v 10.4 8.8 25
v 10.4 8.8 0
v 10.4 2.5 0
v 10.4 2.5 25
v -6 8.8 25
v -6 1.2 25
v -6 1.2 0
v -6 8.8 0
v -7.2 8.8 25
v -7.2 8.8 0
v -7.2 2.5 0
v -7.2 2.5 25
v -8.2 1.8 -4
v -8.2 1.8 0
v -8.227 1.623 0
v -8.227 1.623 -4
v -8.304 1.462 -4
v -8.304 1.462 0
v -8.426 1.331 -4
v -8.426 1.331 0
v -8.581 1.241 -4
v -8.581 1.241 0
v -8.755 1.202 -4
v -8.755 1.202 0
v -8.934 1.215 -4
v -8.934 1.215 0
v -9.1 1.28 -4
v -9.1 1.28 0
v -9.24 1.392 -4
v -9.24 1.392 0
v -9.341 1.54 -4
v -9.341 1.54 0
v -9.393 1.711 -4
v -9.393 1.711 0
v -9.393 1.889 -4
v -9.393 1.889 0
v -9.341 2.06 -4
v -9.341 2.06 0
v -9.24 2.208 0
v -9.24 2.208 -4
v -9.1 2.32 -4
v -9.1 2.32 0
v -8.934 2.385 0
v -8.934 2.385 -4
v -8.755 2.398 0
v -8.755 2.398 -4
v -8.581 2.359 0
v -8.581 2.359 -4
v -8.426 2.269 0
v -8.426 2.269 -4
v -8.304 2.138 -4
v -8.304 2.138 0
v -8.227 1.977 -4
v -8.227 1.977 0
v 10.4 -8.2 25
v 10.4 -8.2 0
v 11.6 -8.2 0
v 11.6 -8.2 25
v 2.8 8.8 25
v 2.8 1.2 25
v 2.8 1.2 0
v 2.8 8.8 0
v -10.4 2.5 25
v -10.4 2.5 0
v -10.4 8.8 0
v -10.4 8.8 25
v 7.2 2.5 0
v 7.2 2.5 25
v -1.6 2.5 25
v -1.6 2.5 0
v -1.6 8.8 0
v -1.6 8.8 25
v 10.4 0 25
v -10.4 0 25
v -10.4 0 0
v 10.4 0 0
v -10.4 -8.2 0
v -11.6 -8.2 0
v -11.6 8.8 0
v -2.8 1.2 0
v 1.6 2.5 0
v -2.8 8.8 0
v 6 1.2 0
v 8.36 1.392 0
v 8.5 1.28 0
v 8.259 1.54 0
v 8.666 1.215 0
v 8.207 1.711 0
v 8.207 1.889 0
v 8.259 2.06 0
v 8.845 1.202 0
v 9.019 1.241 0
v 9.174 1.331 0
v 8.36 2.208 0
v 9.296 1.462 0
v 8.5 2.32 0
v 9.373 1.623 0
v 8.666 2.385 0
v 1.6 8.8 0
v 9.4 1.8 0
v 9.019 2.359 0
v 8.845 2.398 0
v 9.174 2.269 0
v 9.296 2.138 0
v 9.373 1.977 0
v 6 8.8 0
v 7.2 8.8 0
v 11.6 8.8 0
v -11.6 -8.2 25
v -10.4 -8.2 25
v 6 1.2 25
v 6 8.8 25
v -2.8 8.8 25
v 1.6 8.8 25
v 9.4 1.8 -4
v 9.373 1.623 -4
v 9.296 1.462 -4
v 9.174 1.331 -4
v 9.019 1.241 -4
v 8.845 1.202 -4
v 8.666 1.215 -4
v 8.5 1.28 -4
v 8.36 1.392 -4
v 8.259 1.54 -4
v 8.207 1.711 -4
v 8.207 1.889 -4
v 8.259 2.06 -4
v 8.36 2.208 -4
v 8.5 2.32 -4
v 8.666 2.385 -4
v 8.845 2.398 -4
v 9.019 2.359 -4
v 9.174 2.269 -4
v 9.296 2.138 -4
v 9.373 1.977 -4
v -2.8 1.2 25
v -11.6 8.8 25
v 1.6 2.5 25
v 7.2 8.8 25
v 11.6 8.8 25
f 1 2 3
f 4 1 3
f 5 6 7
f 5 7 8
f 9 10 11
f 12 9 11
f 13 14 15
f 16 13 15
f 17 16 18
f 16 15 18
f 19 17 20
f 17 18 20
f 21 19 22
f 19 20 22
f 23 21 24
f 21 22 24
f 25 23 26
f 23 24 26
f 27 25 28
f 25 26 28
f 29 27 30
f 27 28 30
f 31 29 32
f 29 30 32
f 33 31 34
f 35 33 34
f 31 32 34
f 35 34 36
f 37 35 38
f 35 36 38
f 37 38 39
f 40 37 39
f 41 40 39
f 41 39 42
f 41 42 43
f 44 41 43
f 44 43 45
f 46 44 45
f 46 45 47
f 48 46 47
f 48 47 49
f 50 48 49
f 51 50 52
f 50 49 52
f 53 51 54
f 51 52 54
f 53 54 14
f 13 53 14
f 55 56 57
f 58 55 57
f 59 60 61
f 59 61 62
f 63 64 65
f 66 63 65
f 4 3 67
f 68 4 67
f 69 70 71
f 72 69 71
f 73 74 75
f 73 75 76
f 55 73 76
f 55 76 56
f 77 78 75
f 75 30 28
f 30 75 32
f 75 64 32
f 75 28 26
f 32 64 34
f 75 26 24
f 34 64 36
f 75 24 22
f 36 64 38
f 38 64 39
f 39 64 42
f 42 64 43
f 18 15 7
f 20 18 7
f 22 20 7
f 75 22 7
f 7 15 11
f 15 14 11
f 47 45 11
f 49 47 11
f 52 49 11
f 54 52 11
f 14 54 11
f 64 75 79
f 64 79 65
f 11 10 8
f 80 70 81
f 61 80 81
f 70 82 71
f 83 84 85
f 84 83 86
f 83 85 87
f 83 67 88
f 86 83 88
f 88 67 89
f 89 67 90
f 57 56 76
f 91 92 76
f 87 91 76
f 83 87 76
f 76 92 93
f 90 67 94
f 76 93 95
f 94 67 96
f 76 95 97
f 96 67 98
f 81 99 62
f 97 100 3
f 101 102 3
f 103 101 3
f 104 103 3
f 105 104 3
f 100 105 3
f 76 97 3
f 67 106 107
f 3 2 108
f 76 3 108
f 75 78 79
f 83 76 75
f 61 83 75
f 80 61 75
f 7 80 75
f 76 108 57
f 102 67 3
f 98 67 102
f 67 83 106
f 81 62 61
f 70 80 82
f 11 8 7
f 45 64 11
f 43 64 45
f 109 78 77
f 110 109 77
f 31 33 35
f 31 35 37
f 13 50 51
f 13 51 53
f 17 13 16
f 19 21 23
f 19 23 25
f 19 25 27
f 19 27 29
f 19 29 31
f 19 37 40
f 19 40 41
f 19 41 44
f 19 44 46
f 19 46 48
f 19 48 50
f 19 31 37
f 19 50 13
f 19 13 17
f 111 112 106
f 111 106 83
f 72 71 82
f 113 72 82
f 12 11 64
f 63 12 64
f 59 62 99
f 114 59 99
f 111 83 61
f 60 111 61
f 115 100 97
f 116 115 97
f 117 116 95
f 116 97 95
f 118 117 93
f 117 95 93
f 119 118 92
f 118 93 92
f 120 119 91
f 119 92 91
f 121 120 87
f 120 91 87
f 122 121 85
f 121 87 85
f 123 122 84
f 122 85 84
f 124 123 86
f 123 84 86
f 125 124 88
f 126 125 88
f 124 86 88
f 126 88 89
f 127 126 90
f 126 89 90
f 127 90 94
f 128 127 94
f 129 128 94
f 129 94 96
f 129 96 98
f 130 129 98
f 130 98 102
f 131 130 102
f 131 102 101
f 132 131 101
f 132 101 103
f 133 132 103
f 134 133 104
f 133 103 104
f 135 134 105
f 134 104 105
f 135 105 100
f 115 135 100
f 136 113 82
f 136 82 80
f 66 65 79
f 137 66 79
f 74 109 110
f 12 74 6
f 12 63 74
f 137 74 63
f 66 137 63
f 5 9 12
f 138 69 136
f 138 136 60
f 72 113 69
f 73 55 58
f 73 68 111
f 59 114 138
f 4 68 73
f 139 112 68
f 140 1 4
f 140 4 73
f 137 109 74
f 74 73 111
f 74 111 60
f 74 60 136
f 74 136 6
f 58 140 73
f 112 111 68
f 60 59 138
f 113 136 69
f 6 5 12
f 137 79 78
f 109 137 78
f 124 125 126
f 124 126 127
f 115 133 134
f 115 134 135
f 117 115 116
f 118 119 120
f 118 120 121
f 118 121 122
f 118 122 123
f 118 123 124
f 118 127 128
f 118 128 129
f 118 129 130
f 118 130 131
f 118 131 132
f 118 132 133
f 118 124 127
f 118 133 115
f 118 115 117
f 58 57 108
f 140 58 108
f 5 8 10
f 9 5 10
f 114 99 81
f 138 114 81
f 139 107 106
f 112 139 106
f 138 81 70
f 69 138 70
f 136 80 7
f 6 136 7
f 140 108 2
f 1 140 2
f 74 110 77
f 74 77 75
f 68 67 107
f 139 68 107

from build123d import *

# Parameters (mm, degrees)
EXTRUDE_1_DEPTH = 25
SKETCH_2_R      = 0.6
EXTRUDE_2_DEPTH = 4


with BuildPart() as part:
    # 草图1 → 凸台-拉伸1 (new body)
    with BuildSketch(Plane.XY):
        Polygon((-11.6, 8.8), (-11.6, -8.2), (-10.4, -8.2), (-10.4, 0), (10.4, 0), (10.4, -8.2), (11.6, -8.2), (11.6, 8.8), (10.4, 8.8), (10.4, 2.5), (7.2, 2.5), (7.2, 8.8), (6, 8.8), (6, 1.2), (2.8, 1.2), (2.8, 8.8), (1.6, 8.8), (1.6, 2.5), (-1.6, 2.5), (-1.6, 8.8), (-2.8, 8.8), (-2.8, 1.2), (-6, 1.2), (-6, 8.8), (-7.2, 8.8), (-7.2, 2.5), (-10.4, 2.5), (-10.4, 8.8), align=None)
    extrude(amount=EXTRUDE_1_DEPTH)

    # 草图2 → 凸台-拉伸2 (add)
    with BuildSketch(Plane(origin=(0, 0, 0), x_dir=(-1, 0, 0), z_dir=(0, 0, -1))):
        with Locations(Location((-8.8, 1.8, 0), (0, 0, 180))):
            Circle(SKETCH_2_R)
        with Locations(Location((8.8, 1.8, 0), (0, 0, 180))):
            Circle(SKETCH_2_R)
    extrude(amount=EXTRUDE_2_DEPTH)


solid = part.part
